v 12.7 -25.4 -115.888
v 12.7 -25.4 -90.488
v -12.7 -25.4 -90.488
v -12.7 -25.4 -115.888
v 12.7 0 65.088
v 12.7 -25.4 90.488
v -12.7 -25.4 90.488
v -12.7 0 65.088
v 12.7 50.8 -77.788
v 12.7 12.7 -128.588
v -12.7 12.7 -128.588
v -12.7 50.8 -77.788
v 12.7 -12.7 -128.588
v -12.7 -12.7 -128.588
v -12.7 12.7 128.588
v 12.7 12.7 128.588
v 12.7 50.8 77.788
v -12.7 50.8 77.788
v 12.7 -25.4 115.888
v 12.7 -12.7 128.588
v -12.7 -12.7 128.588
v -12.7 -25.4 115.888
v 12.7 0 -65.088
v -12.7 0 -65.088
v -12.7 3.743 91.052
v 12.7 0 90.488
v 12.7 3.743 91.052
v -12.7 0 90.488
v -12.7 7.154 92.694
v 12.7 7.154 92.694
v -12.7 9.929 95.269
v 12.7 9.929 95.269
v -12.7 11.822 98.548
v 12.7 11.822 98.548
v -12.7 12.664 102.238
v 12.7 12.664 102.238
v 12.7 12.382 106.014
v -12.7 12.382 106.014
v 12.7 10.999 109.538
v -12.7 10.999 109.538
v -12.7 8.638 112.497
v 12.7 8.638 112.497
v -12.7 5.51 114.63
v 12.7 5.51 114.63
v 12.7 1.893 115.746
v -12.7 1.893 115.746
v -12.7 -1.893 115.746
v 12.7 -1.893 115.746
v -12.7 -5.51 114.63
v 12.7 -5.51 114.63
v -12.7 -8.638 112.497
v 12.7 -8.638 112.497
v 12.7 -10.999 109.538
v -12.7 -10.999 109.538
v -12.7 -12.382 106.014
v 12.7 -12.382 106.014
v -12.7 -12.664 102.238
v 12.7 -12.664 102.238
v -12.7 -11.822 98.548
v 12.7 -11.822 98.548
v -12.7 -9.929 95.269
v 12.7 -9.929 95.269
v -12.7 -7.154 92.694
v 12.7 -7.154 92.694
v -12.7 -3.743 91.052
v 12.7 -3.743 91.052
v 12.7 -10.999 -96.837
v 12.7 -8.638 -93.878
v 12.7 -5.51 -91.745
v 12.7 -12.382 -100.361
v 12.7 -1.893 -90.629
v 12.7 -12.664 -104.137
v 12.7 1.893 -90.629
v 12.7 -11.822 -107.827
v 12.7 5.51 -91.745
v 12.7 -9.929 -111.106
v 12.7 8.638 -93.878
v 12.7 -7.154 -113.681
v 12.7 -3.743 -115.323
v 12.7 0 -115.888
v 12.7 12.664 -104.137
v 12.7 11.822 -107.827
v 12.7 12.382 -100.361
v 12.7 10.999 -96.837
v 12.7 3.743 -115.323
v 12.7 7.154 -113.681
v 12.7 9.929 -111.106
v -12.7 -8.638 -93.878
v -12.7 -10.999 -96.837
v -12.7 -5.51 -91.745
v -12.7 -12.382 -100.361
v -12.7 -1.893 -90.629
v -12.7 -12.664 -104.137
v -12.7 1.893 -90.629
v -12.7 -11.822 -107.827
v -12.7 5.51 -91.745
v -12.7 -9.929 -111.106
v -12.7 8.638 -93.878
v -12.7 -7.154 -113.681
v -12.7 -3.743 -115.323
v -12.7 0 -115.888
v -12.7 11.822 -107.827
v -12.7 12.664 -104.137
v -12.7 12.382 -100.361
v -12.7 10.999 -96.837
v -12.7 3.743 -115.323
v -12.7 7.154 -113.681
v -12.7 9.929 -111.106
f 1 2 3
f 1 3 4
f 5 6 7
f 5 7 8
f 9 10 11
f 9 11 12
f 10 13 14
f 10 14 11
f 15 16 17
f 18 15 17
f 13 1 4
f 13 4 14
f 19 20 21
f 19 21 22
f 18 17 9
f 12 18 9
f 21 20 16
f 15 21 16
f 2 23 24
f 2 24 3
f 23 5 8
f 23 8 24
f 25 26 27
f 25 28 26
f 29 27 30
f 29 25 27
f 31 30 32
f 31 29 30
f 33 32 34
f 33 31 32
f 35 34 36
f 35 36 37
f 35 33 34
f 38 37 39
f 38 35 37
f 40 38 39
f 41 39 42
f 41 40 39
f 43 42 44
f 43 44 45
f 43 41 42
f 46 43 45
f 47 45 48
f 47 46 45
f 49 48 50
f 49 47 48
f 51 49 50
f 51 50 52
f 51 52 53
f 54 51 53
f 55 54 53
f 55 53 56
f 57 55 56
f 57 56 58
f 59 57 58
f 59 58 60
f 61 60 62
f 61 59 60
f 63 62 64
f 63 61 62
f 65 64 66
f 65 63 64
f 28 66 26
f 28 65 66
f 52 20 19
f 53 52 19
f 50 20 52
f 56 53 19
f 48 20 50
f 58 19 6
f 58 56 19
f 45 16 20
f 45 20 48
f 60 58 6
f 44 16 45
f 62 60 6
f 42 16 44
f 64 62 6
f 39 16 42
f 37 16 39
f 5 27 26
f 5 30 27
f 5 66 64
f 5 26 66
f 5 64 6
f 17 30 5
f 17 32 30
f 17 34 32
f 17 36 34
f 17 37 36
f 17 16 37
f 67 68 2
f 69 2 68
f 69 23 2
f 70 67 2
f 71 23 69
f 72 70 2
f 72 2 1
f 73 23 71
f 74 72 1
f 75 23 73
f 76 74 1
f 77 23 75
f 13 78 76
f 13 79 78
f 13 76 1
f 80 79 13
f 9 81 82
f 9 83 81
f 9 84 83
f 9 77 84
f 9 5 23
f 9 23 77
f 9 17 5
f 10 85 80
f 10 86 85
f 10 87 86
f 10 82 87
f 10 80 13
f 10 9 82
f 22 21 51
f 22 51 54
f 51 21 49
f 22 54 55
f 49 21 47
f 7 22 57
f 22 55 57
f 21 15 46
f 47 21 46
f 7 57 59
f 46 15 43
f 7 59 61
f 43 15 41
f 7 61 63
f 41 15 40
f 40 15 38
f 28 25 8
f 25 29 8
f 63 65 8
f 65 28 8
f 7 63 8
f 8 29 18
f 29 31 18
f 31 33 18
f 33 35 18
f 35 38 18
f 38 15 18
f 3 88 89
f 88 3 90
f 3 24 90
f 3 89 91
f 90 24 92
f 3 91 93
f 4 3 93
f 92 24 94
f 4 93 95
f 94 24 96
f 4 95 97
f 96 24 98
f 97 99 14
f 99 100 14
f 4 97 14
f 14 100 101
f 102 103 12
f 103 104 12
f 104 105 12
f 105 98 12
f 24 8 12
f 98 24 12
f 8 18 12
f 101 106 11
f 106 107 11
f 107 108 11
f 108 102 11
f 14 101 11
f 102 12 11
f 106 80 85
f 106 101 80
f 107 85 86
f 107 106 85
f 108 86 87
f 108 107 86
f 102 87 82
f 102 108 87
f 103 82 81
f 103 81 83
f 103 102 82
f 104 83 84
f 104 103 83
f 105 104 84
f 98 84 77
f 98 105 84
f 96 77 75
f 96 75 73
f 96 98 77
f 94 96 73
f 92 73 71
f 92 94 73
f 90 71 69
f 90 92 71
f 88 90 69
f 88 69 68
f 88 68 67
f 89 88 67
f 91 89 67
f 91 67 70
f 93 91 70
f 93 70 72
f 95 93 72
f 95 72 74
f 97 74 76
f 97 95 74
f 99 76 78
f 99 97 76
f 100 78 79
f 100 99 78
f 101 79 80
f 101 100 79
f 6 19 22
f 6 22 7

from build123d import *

# Parameters (mm, degrees)
SKETCH1_W          = 257.175
SKETCH1_H          = 76.2
SKETCH1_R          = 12.7
EXTRUDE1_DEPTH     = 12.7
CUT_EXTRUDE2_REACH = 142.572


with BuildPart() as part:
    # Sketch1 → Extrude1 (new, symmetric)
    with BuildSketch(Plane(origin=(0, 0, 0), x_dir=(0, 0, -1), z_dir=(1, 0, 0))):
        with Locations((0, 12.7)):
            Rectangle(SKETCH1_W, SKETCH1_H)
        with Locations((-103.1875, 0)):
            Circle(SKETCH1_R, mode=Mode.SUBTRACT)
        with Locations((103.1875, 0)):
            Circle(SKETCH1_R, mode=Mode.SUBTRACT)
    extrude(amount=EXTRUDE1_DEPTH, both=True)

    # Sketch2 → Cut-Extrude2 (cut, up to next)
    with BuildSketch(Plane(origin=(12.7, 0, 0), x_dir=(0, 0, -1), z_dir=(1, 0, 0)), mode=Mode.PRIVATE) as cut_extrude2_sk1:
        Polygon((-90.4875, -25.4), (-65.0875, 0), (65.0875, 0), (90.4875, -25.4), align=None)
    cut_extrude2_tool1 = extrude(cut_extrude2_sk1.sketch, amount=-CUT_EXTRUDE2_REACH, mode=Mode.PRIVATE) & part.part
    # Sketch2 → Cut-Extrude2 (cut, up to next)
    with BuildSketch(Plane(origin=(12.7, 0, 0), x_dir=(0, 0, -1), z_dir=(1, 0, 0)), mode=Mode.PRIVATE) as cut_extrude2_sk2:
        Polygon((-128.5875, 50.8), (-128.5875, 12.7), (-77.7875, 50.8), align=None)
    cut_extrude2_tool2 = extrude(cut_extrude2_sk2.sketch, amount=-CUT_EXTRUDE2_REACH, mode=Mode.PRIVATE) & part.part
    # Sketch2 → Cut-Extrude2 (cut, up to next)
    with BuildSketch(Plane(origin=(12.7, 0, 0), x_dir=(0, 0, -1), z_dir=(1, 0, 0)), mode=Mode.PRIVATE) as cut_extrude2_sk3:
        Polygon((77.7875, 50.8), (128.5875, 50.8), (128.5875, 12.7), align=None)
    cut_extrude2_tool3 = extrude(cut_extrude2_sk3.sketch, amount=-CUT_EXTRUDE2_REACH, mode=Mode.PRIVATE) & part.part
    # Sketch2 → Cut-Extrude2 (cut, up to next)
    with BuildSketch(Plane(origin=(12.7, 0, 0), x_dir=(0, 0, -1), z_dir=(1, 0, 0)), mode=Mode.PRIVATE) as cut_extrude2_sk4:
        Polygon((-128.5875, -25.4), (-128.5875, -12.7), (-115.8875, -25.4), align=None)
    cut_extrude2_tool4 = extrude(cut_extrude2_sk4.sketch, amount=-CUT_EXTRUDE2_REACH, mode=Mode.PRIVATE) & part.part
    # Sketch2 → Cut-Extrude2 (cut, up to next)
    with BuildSketch(Plane(origin=(12.7, 0, 0), x_dir=(0, 0, -1), z_dir=(1, 0, 0)), mode=Mode.PRIVATE) as cut_extrude2_sk5:
        Polygon((128.5875, -12.7), (128.5875, -25.4), (115.8875, -25.4), align=None)
    cut_extrude2_tool5 = extrude(cut_extrude2_sk5.sketch, amount=-CUT_EXTRUDE2_REACH, mode=Mode.PRIVATE) & part.part
    add(cut_extrude2_tool1.solids().sort_by_distance((12.7, -13.391156, 0))[0], mode=Mode.SUBTRACT)
    add(cut_extrude2_tool2.solids().sort_by_distance((12.7, 38.1, 111.654167))[0], mode=Mode.SUBTRACT)
    add(cut_extrude2_tool3.solids().sort_by_distance((12.7, 38.1, -111.654167))[0], mode=Mode.SUBTRACT)
    add(cut_extrude2_tool4.solids().sort_by_distance((12.7, -21.166667, 124.354167))[0], mode=Mode.SUBTRACT)
    add(cut_extrude2_tool5.solids().sort_by_distance((12.7, -21.166667, -124.354167))[0], mode=Mode.SUBTRACT)


solid = part.part
